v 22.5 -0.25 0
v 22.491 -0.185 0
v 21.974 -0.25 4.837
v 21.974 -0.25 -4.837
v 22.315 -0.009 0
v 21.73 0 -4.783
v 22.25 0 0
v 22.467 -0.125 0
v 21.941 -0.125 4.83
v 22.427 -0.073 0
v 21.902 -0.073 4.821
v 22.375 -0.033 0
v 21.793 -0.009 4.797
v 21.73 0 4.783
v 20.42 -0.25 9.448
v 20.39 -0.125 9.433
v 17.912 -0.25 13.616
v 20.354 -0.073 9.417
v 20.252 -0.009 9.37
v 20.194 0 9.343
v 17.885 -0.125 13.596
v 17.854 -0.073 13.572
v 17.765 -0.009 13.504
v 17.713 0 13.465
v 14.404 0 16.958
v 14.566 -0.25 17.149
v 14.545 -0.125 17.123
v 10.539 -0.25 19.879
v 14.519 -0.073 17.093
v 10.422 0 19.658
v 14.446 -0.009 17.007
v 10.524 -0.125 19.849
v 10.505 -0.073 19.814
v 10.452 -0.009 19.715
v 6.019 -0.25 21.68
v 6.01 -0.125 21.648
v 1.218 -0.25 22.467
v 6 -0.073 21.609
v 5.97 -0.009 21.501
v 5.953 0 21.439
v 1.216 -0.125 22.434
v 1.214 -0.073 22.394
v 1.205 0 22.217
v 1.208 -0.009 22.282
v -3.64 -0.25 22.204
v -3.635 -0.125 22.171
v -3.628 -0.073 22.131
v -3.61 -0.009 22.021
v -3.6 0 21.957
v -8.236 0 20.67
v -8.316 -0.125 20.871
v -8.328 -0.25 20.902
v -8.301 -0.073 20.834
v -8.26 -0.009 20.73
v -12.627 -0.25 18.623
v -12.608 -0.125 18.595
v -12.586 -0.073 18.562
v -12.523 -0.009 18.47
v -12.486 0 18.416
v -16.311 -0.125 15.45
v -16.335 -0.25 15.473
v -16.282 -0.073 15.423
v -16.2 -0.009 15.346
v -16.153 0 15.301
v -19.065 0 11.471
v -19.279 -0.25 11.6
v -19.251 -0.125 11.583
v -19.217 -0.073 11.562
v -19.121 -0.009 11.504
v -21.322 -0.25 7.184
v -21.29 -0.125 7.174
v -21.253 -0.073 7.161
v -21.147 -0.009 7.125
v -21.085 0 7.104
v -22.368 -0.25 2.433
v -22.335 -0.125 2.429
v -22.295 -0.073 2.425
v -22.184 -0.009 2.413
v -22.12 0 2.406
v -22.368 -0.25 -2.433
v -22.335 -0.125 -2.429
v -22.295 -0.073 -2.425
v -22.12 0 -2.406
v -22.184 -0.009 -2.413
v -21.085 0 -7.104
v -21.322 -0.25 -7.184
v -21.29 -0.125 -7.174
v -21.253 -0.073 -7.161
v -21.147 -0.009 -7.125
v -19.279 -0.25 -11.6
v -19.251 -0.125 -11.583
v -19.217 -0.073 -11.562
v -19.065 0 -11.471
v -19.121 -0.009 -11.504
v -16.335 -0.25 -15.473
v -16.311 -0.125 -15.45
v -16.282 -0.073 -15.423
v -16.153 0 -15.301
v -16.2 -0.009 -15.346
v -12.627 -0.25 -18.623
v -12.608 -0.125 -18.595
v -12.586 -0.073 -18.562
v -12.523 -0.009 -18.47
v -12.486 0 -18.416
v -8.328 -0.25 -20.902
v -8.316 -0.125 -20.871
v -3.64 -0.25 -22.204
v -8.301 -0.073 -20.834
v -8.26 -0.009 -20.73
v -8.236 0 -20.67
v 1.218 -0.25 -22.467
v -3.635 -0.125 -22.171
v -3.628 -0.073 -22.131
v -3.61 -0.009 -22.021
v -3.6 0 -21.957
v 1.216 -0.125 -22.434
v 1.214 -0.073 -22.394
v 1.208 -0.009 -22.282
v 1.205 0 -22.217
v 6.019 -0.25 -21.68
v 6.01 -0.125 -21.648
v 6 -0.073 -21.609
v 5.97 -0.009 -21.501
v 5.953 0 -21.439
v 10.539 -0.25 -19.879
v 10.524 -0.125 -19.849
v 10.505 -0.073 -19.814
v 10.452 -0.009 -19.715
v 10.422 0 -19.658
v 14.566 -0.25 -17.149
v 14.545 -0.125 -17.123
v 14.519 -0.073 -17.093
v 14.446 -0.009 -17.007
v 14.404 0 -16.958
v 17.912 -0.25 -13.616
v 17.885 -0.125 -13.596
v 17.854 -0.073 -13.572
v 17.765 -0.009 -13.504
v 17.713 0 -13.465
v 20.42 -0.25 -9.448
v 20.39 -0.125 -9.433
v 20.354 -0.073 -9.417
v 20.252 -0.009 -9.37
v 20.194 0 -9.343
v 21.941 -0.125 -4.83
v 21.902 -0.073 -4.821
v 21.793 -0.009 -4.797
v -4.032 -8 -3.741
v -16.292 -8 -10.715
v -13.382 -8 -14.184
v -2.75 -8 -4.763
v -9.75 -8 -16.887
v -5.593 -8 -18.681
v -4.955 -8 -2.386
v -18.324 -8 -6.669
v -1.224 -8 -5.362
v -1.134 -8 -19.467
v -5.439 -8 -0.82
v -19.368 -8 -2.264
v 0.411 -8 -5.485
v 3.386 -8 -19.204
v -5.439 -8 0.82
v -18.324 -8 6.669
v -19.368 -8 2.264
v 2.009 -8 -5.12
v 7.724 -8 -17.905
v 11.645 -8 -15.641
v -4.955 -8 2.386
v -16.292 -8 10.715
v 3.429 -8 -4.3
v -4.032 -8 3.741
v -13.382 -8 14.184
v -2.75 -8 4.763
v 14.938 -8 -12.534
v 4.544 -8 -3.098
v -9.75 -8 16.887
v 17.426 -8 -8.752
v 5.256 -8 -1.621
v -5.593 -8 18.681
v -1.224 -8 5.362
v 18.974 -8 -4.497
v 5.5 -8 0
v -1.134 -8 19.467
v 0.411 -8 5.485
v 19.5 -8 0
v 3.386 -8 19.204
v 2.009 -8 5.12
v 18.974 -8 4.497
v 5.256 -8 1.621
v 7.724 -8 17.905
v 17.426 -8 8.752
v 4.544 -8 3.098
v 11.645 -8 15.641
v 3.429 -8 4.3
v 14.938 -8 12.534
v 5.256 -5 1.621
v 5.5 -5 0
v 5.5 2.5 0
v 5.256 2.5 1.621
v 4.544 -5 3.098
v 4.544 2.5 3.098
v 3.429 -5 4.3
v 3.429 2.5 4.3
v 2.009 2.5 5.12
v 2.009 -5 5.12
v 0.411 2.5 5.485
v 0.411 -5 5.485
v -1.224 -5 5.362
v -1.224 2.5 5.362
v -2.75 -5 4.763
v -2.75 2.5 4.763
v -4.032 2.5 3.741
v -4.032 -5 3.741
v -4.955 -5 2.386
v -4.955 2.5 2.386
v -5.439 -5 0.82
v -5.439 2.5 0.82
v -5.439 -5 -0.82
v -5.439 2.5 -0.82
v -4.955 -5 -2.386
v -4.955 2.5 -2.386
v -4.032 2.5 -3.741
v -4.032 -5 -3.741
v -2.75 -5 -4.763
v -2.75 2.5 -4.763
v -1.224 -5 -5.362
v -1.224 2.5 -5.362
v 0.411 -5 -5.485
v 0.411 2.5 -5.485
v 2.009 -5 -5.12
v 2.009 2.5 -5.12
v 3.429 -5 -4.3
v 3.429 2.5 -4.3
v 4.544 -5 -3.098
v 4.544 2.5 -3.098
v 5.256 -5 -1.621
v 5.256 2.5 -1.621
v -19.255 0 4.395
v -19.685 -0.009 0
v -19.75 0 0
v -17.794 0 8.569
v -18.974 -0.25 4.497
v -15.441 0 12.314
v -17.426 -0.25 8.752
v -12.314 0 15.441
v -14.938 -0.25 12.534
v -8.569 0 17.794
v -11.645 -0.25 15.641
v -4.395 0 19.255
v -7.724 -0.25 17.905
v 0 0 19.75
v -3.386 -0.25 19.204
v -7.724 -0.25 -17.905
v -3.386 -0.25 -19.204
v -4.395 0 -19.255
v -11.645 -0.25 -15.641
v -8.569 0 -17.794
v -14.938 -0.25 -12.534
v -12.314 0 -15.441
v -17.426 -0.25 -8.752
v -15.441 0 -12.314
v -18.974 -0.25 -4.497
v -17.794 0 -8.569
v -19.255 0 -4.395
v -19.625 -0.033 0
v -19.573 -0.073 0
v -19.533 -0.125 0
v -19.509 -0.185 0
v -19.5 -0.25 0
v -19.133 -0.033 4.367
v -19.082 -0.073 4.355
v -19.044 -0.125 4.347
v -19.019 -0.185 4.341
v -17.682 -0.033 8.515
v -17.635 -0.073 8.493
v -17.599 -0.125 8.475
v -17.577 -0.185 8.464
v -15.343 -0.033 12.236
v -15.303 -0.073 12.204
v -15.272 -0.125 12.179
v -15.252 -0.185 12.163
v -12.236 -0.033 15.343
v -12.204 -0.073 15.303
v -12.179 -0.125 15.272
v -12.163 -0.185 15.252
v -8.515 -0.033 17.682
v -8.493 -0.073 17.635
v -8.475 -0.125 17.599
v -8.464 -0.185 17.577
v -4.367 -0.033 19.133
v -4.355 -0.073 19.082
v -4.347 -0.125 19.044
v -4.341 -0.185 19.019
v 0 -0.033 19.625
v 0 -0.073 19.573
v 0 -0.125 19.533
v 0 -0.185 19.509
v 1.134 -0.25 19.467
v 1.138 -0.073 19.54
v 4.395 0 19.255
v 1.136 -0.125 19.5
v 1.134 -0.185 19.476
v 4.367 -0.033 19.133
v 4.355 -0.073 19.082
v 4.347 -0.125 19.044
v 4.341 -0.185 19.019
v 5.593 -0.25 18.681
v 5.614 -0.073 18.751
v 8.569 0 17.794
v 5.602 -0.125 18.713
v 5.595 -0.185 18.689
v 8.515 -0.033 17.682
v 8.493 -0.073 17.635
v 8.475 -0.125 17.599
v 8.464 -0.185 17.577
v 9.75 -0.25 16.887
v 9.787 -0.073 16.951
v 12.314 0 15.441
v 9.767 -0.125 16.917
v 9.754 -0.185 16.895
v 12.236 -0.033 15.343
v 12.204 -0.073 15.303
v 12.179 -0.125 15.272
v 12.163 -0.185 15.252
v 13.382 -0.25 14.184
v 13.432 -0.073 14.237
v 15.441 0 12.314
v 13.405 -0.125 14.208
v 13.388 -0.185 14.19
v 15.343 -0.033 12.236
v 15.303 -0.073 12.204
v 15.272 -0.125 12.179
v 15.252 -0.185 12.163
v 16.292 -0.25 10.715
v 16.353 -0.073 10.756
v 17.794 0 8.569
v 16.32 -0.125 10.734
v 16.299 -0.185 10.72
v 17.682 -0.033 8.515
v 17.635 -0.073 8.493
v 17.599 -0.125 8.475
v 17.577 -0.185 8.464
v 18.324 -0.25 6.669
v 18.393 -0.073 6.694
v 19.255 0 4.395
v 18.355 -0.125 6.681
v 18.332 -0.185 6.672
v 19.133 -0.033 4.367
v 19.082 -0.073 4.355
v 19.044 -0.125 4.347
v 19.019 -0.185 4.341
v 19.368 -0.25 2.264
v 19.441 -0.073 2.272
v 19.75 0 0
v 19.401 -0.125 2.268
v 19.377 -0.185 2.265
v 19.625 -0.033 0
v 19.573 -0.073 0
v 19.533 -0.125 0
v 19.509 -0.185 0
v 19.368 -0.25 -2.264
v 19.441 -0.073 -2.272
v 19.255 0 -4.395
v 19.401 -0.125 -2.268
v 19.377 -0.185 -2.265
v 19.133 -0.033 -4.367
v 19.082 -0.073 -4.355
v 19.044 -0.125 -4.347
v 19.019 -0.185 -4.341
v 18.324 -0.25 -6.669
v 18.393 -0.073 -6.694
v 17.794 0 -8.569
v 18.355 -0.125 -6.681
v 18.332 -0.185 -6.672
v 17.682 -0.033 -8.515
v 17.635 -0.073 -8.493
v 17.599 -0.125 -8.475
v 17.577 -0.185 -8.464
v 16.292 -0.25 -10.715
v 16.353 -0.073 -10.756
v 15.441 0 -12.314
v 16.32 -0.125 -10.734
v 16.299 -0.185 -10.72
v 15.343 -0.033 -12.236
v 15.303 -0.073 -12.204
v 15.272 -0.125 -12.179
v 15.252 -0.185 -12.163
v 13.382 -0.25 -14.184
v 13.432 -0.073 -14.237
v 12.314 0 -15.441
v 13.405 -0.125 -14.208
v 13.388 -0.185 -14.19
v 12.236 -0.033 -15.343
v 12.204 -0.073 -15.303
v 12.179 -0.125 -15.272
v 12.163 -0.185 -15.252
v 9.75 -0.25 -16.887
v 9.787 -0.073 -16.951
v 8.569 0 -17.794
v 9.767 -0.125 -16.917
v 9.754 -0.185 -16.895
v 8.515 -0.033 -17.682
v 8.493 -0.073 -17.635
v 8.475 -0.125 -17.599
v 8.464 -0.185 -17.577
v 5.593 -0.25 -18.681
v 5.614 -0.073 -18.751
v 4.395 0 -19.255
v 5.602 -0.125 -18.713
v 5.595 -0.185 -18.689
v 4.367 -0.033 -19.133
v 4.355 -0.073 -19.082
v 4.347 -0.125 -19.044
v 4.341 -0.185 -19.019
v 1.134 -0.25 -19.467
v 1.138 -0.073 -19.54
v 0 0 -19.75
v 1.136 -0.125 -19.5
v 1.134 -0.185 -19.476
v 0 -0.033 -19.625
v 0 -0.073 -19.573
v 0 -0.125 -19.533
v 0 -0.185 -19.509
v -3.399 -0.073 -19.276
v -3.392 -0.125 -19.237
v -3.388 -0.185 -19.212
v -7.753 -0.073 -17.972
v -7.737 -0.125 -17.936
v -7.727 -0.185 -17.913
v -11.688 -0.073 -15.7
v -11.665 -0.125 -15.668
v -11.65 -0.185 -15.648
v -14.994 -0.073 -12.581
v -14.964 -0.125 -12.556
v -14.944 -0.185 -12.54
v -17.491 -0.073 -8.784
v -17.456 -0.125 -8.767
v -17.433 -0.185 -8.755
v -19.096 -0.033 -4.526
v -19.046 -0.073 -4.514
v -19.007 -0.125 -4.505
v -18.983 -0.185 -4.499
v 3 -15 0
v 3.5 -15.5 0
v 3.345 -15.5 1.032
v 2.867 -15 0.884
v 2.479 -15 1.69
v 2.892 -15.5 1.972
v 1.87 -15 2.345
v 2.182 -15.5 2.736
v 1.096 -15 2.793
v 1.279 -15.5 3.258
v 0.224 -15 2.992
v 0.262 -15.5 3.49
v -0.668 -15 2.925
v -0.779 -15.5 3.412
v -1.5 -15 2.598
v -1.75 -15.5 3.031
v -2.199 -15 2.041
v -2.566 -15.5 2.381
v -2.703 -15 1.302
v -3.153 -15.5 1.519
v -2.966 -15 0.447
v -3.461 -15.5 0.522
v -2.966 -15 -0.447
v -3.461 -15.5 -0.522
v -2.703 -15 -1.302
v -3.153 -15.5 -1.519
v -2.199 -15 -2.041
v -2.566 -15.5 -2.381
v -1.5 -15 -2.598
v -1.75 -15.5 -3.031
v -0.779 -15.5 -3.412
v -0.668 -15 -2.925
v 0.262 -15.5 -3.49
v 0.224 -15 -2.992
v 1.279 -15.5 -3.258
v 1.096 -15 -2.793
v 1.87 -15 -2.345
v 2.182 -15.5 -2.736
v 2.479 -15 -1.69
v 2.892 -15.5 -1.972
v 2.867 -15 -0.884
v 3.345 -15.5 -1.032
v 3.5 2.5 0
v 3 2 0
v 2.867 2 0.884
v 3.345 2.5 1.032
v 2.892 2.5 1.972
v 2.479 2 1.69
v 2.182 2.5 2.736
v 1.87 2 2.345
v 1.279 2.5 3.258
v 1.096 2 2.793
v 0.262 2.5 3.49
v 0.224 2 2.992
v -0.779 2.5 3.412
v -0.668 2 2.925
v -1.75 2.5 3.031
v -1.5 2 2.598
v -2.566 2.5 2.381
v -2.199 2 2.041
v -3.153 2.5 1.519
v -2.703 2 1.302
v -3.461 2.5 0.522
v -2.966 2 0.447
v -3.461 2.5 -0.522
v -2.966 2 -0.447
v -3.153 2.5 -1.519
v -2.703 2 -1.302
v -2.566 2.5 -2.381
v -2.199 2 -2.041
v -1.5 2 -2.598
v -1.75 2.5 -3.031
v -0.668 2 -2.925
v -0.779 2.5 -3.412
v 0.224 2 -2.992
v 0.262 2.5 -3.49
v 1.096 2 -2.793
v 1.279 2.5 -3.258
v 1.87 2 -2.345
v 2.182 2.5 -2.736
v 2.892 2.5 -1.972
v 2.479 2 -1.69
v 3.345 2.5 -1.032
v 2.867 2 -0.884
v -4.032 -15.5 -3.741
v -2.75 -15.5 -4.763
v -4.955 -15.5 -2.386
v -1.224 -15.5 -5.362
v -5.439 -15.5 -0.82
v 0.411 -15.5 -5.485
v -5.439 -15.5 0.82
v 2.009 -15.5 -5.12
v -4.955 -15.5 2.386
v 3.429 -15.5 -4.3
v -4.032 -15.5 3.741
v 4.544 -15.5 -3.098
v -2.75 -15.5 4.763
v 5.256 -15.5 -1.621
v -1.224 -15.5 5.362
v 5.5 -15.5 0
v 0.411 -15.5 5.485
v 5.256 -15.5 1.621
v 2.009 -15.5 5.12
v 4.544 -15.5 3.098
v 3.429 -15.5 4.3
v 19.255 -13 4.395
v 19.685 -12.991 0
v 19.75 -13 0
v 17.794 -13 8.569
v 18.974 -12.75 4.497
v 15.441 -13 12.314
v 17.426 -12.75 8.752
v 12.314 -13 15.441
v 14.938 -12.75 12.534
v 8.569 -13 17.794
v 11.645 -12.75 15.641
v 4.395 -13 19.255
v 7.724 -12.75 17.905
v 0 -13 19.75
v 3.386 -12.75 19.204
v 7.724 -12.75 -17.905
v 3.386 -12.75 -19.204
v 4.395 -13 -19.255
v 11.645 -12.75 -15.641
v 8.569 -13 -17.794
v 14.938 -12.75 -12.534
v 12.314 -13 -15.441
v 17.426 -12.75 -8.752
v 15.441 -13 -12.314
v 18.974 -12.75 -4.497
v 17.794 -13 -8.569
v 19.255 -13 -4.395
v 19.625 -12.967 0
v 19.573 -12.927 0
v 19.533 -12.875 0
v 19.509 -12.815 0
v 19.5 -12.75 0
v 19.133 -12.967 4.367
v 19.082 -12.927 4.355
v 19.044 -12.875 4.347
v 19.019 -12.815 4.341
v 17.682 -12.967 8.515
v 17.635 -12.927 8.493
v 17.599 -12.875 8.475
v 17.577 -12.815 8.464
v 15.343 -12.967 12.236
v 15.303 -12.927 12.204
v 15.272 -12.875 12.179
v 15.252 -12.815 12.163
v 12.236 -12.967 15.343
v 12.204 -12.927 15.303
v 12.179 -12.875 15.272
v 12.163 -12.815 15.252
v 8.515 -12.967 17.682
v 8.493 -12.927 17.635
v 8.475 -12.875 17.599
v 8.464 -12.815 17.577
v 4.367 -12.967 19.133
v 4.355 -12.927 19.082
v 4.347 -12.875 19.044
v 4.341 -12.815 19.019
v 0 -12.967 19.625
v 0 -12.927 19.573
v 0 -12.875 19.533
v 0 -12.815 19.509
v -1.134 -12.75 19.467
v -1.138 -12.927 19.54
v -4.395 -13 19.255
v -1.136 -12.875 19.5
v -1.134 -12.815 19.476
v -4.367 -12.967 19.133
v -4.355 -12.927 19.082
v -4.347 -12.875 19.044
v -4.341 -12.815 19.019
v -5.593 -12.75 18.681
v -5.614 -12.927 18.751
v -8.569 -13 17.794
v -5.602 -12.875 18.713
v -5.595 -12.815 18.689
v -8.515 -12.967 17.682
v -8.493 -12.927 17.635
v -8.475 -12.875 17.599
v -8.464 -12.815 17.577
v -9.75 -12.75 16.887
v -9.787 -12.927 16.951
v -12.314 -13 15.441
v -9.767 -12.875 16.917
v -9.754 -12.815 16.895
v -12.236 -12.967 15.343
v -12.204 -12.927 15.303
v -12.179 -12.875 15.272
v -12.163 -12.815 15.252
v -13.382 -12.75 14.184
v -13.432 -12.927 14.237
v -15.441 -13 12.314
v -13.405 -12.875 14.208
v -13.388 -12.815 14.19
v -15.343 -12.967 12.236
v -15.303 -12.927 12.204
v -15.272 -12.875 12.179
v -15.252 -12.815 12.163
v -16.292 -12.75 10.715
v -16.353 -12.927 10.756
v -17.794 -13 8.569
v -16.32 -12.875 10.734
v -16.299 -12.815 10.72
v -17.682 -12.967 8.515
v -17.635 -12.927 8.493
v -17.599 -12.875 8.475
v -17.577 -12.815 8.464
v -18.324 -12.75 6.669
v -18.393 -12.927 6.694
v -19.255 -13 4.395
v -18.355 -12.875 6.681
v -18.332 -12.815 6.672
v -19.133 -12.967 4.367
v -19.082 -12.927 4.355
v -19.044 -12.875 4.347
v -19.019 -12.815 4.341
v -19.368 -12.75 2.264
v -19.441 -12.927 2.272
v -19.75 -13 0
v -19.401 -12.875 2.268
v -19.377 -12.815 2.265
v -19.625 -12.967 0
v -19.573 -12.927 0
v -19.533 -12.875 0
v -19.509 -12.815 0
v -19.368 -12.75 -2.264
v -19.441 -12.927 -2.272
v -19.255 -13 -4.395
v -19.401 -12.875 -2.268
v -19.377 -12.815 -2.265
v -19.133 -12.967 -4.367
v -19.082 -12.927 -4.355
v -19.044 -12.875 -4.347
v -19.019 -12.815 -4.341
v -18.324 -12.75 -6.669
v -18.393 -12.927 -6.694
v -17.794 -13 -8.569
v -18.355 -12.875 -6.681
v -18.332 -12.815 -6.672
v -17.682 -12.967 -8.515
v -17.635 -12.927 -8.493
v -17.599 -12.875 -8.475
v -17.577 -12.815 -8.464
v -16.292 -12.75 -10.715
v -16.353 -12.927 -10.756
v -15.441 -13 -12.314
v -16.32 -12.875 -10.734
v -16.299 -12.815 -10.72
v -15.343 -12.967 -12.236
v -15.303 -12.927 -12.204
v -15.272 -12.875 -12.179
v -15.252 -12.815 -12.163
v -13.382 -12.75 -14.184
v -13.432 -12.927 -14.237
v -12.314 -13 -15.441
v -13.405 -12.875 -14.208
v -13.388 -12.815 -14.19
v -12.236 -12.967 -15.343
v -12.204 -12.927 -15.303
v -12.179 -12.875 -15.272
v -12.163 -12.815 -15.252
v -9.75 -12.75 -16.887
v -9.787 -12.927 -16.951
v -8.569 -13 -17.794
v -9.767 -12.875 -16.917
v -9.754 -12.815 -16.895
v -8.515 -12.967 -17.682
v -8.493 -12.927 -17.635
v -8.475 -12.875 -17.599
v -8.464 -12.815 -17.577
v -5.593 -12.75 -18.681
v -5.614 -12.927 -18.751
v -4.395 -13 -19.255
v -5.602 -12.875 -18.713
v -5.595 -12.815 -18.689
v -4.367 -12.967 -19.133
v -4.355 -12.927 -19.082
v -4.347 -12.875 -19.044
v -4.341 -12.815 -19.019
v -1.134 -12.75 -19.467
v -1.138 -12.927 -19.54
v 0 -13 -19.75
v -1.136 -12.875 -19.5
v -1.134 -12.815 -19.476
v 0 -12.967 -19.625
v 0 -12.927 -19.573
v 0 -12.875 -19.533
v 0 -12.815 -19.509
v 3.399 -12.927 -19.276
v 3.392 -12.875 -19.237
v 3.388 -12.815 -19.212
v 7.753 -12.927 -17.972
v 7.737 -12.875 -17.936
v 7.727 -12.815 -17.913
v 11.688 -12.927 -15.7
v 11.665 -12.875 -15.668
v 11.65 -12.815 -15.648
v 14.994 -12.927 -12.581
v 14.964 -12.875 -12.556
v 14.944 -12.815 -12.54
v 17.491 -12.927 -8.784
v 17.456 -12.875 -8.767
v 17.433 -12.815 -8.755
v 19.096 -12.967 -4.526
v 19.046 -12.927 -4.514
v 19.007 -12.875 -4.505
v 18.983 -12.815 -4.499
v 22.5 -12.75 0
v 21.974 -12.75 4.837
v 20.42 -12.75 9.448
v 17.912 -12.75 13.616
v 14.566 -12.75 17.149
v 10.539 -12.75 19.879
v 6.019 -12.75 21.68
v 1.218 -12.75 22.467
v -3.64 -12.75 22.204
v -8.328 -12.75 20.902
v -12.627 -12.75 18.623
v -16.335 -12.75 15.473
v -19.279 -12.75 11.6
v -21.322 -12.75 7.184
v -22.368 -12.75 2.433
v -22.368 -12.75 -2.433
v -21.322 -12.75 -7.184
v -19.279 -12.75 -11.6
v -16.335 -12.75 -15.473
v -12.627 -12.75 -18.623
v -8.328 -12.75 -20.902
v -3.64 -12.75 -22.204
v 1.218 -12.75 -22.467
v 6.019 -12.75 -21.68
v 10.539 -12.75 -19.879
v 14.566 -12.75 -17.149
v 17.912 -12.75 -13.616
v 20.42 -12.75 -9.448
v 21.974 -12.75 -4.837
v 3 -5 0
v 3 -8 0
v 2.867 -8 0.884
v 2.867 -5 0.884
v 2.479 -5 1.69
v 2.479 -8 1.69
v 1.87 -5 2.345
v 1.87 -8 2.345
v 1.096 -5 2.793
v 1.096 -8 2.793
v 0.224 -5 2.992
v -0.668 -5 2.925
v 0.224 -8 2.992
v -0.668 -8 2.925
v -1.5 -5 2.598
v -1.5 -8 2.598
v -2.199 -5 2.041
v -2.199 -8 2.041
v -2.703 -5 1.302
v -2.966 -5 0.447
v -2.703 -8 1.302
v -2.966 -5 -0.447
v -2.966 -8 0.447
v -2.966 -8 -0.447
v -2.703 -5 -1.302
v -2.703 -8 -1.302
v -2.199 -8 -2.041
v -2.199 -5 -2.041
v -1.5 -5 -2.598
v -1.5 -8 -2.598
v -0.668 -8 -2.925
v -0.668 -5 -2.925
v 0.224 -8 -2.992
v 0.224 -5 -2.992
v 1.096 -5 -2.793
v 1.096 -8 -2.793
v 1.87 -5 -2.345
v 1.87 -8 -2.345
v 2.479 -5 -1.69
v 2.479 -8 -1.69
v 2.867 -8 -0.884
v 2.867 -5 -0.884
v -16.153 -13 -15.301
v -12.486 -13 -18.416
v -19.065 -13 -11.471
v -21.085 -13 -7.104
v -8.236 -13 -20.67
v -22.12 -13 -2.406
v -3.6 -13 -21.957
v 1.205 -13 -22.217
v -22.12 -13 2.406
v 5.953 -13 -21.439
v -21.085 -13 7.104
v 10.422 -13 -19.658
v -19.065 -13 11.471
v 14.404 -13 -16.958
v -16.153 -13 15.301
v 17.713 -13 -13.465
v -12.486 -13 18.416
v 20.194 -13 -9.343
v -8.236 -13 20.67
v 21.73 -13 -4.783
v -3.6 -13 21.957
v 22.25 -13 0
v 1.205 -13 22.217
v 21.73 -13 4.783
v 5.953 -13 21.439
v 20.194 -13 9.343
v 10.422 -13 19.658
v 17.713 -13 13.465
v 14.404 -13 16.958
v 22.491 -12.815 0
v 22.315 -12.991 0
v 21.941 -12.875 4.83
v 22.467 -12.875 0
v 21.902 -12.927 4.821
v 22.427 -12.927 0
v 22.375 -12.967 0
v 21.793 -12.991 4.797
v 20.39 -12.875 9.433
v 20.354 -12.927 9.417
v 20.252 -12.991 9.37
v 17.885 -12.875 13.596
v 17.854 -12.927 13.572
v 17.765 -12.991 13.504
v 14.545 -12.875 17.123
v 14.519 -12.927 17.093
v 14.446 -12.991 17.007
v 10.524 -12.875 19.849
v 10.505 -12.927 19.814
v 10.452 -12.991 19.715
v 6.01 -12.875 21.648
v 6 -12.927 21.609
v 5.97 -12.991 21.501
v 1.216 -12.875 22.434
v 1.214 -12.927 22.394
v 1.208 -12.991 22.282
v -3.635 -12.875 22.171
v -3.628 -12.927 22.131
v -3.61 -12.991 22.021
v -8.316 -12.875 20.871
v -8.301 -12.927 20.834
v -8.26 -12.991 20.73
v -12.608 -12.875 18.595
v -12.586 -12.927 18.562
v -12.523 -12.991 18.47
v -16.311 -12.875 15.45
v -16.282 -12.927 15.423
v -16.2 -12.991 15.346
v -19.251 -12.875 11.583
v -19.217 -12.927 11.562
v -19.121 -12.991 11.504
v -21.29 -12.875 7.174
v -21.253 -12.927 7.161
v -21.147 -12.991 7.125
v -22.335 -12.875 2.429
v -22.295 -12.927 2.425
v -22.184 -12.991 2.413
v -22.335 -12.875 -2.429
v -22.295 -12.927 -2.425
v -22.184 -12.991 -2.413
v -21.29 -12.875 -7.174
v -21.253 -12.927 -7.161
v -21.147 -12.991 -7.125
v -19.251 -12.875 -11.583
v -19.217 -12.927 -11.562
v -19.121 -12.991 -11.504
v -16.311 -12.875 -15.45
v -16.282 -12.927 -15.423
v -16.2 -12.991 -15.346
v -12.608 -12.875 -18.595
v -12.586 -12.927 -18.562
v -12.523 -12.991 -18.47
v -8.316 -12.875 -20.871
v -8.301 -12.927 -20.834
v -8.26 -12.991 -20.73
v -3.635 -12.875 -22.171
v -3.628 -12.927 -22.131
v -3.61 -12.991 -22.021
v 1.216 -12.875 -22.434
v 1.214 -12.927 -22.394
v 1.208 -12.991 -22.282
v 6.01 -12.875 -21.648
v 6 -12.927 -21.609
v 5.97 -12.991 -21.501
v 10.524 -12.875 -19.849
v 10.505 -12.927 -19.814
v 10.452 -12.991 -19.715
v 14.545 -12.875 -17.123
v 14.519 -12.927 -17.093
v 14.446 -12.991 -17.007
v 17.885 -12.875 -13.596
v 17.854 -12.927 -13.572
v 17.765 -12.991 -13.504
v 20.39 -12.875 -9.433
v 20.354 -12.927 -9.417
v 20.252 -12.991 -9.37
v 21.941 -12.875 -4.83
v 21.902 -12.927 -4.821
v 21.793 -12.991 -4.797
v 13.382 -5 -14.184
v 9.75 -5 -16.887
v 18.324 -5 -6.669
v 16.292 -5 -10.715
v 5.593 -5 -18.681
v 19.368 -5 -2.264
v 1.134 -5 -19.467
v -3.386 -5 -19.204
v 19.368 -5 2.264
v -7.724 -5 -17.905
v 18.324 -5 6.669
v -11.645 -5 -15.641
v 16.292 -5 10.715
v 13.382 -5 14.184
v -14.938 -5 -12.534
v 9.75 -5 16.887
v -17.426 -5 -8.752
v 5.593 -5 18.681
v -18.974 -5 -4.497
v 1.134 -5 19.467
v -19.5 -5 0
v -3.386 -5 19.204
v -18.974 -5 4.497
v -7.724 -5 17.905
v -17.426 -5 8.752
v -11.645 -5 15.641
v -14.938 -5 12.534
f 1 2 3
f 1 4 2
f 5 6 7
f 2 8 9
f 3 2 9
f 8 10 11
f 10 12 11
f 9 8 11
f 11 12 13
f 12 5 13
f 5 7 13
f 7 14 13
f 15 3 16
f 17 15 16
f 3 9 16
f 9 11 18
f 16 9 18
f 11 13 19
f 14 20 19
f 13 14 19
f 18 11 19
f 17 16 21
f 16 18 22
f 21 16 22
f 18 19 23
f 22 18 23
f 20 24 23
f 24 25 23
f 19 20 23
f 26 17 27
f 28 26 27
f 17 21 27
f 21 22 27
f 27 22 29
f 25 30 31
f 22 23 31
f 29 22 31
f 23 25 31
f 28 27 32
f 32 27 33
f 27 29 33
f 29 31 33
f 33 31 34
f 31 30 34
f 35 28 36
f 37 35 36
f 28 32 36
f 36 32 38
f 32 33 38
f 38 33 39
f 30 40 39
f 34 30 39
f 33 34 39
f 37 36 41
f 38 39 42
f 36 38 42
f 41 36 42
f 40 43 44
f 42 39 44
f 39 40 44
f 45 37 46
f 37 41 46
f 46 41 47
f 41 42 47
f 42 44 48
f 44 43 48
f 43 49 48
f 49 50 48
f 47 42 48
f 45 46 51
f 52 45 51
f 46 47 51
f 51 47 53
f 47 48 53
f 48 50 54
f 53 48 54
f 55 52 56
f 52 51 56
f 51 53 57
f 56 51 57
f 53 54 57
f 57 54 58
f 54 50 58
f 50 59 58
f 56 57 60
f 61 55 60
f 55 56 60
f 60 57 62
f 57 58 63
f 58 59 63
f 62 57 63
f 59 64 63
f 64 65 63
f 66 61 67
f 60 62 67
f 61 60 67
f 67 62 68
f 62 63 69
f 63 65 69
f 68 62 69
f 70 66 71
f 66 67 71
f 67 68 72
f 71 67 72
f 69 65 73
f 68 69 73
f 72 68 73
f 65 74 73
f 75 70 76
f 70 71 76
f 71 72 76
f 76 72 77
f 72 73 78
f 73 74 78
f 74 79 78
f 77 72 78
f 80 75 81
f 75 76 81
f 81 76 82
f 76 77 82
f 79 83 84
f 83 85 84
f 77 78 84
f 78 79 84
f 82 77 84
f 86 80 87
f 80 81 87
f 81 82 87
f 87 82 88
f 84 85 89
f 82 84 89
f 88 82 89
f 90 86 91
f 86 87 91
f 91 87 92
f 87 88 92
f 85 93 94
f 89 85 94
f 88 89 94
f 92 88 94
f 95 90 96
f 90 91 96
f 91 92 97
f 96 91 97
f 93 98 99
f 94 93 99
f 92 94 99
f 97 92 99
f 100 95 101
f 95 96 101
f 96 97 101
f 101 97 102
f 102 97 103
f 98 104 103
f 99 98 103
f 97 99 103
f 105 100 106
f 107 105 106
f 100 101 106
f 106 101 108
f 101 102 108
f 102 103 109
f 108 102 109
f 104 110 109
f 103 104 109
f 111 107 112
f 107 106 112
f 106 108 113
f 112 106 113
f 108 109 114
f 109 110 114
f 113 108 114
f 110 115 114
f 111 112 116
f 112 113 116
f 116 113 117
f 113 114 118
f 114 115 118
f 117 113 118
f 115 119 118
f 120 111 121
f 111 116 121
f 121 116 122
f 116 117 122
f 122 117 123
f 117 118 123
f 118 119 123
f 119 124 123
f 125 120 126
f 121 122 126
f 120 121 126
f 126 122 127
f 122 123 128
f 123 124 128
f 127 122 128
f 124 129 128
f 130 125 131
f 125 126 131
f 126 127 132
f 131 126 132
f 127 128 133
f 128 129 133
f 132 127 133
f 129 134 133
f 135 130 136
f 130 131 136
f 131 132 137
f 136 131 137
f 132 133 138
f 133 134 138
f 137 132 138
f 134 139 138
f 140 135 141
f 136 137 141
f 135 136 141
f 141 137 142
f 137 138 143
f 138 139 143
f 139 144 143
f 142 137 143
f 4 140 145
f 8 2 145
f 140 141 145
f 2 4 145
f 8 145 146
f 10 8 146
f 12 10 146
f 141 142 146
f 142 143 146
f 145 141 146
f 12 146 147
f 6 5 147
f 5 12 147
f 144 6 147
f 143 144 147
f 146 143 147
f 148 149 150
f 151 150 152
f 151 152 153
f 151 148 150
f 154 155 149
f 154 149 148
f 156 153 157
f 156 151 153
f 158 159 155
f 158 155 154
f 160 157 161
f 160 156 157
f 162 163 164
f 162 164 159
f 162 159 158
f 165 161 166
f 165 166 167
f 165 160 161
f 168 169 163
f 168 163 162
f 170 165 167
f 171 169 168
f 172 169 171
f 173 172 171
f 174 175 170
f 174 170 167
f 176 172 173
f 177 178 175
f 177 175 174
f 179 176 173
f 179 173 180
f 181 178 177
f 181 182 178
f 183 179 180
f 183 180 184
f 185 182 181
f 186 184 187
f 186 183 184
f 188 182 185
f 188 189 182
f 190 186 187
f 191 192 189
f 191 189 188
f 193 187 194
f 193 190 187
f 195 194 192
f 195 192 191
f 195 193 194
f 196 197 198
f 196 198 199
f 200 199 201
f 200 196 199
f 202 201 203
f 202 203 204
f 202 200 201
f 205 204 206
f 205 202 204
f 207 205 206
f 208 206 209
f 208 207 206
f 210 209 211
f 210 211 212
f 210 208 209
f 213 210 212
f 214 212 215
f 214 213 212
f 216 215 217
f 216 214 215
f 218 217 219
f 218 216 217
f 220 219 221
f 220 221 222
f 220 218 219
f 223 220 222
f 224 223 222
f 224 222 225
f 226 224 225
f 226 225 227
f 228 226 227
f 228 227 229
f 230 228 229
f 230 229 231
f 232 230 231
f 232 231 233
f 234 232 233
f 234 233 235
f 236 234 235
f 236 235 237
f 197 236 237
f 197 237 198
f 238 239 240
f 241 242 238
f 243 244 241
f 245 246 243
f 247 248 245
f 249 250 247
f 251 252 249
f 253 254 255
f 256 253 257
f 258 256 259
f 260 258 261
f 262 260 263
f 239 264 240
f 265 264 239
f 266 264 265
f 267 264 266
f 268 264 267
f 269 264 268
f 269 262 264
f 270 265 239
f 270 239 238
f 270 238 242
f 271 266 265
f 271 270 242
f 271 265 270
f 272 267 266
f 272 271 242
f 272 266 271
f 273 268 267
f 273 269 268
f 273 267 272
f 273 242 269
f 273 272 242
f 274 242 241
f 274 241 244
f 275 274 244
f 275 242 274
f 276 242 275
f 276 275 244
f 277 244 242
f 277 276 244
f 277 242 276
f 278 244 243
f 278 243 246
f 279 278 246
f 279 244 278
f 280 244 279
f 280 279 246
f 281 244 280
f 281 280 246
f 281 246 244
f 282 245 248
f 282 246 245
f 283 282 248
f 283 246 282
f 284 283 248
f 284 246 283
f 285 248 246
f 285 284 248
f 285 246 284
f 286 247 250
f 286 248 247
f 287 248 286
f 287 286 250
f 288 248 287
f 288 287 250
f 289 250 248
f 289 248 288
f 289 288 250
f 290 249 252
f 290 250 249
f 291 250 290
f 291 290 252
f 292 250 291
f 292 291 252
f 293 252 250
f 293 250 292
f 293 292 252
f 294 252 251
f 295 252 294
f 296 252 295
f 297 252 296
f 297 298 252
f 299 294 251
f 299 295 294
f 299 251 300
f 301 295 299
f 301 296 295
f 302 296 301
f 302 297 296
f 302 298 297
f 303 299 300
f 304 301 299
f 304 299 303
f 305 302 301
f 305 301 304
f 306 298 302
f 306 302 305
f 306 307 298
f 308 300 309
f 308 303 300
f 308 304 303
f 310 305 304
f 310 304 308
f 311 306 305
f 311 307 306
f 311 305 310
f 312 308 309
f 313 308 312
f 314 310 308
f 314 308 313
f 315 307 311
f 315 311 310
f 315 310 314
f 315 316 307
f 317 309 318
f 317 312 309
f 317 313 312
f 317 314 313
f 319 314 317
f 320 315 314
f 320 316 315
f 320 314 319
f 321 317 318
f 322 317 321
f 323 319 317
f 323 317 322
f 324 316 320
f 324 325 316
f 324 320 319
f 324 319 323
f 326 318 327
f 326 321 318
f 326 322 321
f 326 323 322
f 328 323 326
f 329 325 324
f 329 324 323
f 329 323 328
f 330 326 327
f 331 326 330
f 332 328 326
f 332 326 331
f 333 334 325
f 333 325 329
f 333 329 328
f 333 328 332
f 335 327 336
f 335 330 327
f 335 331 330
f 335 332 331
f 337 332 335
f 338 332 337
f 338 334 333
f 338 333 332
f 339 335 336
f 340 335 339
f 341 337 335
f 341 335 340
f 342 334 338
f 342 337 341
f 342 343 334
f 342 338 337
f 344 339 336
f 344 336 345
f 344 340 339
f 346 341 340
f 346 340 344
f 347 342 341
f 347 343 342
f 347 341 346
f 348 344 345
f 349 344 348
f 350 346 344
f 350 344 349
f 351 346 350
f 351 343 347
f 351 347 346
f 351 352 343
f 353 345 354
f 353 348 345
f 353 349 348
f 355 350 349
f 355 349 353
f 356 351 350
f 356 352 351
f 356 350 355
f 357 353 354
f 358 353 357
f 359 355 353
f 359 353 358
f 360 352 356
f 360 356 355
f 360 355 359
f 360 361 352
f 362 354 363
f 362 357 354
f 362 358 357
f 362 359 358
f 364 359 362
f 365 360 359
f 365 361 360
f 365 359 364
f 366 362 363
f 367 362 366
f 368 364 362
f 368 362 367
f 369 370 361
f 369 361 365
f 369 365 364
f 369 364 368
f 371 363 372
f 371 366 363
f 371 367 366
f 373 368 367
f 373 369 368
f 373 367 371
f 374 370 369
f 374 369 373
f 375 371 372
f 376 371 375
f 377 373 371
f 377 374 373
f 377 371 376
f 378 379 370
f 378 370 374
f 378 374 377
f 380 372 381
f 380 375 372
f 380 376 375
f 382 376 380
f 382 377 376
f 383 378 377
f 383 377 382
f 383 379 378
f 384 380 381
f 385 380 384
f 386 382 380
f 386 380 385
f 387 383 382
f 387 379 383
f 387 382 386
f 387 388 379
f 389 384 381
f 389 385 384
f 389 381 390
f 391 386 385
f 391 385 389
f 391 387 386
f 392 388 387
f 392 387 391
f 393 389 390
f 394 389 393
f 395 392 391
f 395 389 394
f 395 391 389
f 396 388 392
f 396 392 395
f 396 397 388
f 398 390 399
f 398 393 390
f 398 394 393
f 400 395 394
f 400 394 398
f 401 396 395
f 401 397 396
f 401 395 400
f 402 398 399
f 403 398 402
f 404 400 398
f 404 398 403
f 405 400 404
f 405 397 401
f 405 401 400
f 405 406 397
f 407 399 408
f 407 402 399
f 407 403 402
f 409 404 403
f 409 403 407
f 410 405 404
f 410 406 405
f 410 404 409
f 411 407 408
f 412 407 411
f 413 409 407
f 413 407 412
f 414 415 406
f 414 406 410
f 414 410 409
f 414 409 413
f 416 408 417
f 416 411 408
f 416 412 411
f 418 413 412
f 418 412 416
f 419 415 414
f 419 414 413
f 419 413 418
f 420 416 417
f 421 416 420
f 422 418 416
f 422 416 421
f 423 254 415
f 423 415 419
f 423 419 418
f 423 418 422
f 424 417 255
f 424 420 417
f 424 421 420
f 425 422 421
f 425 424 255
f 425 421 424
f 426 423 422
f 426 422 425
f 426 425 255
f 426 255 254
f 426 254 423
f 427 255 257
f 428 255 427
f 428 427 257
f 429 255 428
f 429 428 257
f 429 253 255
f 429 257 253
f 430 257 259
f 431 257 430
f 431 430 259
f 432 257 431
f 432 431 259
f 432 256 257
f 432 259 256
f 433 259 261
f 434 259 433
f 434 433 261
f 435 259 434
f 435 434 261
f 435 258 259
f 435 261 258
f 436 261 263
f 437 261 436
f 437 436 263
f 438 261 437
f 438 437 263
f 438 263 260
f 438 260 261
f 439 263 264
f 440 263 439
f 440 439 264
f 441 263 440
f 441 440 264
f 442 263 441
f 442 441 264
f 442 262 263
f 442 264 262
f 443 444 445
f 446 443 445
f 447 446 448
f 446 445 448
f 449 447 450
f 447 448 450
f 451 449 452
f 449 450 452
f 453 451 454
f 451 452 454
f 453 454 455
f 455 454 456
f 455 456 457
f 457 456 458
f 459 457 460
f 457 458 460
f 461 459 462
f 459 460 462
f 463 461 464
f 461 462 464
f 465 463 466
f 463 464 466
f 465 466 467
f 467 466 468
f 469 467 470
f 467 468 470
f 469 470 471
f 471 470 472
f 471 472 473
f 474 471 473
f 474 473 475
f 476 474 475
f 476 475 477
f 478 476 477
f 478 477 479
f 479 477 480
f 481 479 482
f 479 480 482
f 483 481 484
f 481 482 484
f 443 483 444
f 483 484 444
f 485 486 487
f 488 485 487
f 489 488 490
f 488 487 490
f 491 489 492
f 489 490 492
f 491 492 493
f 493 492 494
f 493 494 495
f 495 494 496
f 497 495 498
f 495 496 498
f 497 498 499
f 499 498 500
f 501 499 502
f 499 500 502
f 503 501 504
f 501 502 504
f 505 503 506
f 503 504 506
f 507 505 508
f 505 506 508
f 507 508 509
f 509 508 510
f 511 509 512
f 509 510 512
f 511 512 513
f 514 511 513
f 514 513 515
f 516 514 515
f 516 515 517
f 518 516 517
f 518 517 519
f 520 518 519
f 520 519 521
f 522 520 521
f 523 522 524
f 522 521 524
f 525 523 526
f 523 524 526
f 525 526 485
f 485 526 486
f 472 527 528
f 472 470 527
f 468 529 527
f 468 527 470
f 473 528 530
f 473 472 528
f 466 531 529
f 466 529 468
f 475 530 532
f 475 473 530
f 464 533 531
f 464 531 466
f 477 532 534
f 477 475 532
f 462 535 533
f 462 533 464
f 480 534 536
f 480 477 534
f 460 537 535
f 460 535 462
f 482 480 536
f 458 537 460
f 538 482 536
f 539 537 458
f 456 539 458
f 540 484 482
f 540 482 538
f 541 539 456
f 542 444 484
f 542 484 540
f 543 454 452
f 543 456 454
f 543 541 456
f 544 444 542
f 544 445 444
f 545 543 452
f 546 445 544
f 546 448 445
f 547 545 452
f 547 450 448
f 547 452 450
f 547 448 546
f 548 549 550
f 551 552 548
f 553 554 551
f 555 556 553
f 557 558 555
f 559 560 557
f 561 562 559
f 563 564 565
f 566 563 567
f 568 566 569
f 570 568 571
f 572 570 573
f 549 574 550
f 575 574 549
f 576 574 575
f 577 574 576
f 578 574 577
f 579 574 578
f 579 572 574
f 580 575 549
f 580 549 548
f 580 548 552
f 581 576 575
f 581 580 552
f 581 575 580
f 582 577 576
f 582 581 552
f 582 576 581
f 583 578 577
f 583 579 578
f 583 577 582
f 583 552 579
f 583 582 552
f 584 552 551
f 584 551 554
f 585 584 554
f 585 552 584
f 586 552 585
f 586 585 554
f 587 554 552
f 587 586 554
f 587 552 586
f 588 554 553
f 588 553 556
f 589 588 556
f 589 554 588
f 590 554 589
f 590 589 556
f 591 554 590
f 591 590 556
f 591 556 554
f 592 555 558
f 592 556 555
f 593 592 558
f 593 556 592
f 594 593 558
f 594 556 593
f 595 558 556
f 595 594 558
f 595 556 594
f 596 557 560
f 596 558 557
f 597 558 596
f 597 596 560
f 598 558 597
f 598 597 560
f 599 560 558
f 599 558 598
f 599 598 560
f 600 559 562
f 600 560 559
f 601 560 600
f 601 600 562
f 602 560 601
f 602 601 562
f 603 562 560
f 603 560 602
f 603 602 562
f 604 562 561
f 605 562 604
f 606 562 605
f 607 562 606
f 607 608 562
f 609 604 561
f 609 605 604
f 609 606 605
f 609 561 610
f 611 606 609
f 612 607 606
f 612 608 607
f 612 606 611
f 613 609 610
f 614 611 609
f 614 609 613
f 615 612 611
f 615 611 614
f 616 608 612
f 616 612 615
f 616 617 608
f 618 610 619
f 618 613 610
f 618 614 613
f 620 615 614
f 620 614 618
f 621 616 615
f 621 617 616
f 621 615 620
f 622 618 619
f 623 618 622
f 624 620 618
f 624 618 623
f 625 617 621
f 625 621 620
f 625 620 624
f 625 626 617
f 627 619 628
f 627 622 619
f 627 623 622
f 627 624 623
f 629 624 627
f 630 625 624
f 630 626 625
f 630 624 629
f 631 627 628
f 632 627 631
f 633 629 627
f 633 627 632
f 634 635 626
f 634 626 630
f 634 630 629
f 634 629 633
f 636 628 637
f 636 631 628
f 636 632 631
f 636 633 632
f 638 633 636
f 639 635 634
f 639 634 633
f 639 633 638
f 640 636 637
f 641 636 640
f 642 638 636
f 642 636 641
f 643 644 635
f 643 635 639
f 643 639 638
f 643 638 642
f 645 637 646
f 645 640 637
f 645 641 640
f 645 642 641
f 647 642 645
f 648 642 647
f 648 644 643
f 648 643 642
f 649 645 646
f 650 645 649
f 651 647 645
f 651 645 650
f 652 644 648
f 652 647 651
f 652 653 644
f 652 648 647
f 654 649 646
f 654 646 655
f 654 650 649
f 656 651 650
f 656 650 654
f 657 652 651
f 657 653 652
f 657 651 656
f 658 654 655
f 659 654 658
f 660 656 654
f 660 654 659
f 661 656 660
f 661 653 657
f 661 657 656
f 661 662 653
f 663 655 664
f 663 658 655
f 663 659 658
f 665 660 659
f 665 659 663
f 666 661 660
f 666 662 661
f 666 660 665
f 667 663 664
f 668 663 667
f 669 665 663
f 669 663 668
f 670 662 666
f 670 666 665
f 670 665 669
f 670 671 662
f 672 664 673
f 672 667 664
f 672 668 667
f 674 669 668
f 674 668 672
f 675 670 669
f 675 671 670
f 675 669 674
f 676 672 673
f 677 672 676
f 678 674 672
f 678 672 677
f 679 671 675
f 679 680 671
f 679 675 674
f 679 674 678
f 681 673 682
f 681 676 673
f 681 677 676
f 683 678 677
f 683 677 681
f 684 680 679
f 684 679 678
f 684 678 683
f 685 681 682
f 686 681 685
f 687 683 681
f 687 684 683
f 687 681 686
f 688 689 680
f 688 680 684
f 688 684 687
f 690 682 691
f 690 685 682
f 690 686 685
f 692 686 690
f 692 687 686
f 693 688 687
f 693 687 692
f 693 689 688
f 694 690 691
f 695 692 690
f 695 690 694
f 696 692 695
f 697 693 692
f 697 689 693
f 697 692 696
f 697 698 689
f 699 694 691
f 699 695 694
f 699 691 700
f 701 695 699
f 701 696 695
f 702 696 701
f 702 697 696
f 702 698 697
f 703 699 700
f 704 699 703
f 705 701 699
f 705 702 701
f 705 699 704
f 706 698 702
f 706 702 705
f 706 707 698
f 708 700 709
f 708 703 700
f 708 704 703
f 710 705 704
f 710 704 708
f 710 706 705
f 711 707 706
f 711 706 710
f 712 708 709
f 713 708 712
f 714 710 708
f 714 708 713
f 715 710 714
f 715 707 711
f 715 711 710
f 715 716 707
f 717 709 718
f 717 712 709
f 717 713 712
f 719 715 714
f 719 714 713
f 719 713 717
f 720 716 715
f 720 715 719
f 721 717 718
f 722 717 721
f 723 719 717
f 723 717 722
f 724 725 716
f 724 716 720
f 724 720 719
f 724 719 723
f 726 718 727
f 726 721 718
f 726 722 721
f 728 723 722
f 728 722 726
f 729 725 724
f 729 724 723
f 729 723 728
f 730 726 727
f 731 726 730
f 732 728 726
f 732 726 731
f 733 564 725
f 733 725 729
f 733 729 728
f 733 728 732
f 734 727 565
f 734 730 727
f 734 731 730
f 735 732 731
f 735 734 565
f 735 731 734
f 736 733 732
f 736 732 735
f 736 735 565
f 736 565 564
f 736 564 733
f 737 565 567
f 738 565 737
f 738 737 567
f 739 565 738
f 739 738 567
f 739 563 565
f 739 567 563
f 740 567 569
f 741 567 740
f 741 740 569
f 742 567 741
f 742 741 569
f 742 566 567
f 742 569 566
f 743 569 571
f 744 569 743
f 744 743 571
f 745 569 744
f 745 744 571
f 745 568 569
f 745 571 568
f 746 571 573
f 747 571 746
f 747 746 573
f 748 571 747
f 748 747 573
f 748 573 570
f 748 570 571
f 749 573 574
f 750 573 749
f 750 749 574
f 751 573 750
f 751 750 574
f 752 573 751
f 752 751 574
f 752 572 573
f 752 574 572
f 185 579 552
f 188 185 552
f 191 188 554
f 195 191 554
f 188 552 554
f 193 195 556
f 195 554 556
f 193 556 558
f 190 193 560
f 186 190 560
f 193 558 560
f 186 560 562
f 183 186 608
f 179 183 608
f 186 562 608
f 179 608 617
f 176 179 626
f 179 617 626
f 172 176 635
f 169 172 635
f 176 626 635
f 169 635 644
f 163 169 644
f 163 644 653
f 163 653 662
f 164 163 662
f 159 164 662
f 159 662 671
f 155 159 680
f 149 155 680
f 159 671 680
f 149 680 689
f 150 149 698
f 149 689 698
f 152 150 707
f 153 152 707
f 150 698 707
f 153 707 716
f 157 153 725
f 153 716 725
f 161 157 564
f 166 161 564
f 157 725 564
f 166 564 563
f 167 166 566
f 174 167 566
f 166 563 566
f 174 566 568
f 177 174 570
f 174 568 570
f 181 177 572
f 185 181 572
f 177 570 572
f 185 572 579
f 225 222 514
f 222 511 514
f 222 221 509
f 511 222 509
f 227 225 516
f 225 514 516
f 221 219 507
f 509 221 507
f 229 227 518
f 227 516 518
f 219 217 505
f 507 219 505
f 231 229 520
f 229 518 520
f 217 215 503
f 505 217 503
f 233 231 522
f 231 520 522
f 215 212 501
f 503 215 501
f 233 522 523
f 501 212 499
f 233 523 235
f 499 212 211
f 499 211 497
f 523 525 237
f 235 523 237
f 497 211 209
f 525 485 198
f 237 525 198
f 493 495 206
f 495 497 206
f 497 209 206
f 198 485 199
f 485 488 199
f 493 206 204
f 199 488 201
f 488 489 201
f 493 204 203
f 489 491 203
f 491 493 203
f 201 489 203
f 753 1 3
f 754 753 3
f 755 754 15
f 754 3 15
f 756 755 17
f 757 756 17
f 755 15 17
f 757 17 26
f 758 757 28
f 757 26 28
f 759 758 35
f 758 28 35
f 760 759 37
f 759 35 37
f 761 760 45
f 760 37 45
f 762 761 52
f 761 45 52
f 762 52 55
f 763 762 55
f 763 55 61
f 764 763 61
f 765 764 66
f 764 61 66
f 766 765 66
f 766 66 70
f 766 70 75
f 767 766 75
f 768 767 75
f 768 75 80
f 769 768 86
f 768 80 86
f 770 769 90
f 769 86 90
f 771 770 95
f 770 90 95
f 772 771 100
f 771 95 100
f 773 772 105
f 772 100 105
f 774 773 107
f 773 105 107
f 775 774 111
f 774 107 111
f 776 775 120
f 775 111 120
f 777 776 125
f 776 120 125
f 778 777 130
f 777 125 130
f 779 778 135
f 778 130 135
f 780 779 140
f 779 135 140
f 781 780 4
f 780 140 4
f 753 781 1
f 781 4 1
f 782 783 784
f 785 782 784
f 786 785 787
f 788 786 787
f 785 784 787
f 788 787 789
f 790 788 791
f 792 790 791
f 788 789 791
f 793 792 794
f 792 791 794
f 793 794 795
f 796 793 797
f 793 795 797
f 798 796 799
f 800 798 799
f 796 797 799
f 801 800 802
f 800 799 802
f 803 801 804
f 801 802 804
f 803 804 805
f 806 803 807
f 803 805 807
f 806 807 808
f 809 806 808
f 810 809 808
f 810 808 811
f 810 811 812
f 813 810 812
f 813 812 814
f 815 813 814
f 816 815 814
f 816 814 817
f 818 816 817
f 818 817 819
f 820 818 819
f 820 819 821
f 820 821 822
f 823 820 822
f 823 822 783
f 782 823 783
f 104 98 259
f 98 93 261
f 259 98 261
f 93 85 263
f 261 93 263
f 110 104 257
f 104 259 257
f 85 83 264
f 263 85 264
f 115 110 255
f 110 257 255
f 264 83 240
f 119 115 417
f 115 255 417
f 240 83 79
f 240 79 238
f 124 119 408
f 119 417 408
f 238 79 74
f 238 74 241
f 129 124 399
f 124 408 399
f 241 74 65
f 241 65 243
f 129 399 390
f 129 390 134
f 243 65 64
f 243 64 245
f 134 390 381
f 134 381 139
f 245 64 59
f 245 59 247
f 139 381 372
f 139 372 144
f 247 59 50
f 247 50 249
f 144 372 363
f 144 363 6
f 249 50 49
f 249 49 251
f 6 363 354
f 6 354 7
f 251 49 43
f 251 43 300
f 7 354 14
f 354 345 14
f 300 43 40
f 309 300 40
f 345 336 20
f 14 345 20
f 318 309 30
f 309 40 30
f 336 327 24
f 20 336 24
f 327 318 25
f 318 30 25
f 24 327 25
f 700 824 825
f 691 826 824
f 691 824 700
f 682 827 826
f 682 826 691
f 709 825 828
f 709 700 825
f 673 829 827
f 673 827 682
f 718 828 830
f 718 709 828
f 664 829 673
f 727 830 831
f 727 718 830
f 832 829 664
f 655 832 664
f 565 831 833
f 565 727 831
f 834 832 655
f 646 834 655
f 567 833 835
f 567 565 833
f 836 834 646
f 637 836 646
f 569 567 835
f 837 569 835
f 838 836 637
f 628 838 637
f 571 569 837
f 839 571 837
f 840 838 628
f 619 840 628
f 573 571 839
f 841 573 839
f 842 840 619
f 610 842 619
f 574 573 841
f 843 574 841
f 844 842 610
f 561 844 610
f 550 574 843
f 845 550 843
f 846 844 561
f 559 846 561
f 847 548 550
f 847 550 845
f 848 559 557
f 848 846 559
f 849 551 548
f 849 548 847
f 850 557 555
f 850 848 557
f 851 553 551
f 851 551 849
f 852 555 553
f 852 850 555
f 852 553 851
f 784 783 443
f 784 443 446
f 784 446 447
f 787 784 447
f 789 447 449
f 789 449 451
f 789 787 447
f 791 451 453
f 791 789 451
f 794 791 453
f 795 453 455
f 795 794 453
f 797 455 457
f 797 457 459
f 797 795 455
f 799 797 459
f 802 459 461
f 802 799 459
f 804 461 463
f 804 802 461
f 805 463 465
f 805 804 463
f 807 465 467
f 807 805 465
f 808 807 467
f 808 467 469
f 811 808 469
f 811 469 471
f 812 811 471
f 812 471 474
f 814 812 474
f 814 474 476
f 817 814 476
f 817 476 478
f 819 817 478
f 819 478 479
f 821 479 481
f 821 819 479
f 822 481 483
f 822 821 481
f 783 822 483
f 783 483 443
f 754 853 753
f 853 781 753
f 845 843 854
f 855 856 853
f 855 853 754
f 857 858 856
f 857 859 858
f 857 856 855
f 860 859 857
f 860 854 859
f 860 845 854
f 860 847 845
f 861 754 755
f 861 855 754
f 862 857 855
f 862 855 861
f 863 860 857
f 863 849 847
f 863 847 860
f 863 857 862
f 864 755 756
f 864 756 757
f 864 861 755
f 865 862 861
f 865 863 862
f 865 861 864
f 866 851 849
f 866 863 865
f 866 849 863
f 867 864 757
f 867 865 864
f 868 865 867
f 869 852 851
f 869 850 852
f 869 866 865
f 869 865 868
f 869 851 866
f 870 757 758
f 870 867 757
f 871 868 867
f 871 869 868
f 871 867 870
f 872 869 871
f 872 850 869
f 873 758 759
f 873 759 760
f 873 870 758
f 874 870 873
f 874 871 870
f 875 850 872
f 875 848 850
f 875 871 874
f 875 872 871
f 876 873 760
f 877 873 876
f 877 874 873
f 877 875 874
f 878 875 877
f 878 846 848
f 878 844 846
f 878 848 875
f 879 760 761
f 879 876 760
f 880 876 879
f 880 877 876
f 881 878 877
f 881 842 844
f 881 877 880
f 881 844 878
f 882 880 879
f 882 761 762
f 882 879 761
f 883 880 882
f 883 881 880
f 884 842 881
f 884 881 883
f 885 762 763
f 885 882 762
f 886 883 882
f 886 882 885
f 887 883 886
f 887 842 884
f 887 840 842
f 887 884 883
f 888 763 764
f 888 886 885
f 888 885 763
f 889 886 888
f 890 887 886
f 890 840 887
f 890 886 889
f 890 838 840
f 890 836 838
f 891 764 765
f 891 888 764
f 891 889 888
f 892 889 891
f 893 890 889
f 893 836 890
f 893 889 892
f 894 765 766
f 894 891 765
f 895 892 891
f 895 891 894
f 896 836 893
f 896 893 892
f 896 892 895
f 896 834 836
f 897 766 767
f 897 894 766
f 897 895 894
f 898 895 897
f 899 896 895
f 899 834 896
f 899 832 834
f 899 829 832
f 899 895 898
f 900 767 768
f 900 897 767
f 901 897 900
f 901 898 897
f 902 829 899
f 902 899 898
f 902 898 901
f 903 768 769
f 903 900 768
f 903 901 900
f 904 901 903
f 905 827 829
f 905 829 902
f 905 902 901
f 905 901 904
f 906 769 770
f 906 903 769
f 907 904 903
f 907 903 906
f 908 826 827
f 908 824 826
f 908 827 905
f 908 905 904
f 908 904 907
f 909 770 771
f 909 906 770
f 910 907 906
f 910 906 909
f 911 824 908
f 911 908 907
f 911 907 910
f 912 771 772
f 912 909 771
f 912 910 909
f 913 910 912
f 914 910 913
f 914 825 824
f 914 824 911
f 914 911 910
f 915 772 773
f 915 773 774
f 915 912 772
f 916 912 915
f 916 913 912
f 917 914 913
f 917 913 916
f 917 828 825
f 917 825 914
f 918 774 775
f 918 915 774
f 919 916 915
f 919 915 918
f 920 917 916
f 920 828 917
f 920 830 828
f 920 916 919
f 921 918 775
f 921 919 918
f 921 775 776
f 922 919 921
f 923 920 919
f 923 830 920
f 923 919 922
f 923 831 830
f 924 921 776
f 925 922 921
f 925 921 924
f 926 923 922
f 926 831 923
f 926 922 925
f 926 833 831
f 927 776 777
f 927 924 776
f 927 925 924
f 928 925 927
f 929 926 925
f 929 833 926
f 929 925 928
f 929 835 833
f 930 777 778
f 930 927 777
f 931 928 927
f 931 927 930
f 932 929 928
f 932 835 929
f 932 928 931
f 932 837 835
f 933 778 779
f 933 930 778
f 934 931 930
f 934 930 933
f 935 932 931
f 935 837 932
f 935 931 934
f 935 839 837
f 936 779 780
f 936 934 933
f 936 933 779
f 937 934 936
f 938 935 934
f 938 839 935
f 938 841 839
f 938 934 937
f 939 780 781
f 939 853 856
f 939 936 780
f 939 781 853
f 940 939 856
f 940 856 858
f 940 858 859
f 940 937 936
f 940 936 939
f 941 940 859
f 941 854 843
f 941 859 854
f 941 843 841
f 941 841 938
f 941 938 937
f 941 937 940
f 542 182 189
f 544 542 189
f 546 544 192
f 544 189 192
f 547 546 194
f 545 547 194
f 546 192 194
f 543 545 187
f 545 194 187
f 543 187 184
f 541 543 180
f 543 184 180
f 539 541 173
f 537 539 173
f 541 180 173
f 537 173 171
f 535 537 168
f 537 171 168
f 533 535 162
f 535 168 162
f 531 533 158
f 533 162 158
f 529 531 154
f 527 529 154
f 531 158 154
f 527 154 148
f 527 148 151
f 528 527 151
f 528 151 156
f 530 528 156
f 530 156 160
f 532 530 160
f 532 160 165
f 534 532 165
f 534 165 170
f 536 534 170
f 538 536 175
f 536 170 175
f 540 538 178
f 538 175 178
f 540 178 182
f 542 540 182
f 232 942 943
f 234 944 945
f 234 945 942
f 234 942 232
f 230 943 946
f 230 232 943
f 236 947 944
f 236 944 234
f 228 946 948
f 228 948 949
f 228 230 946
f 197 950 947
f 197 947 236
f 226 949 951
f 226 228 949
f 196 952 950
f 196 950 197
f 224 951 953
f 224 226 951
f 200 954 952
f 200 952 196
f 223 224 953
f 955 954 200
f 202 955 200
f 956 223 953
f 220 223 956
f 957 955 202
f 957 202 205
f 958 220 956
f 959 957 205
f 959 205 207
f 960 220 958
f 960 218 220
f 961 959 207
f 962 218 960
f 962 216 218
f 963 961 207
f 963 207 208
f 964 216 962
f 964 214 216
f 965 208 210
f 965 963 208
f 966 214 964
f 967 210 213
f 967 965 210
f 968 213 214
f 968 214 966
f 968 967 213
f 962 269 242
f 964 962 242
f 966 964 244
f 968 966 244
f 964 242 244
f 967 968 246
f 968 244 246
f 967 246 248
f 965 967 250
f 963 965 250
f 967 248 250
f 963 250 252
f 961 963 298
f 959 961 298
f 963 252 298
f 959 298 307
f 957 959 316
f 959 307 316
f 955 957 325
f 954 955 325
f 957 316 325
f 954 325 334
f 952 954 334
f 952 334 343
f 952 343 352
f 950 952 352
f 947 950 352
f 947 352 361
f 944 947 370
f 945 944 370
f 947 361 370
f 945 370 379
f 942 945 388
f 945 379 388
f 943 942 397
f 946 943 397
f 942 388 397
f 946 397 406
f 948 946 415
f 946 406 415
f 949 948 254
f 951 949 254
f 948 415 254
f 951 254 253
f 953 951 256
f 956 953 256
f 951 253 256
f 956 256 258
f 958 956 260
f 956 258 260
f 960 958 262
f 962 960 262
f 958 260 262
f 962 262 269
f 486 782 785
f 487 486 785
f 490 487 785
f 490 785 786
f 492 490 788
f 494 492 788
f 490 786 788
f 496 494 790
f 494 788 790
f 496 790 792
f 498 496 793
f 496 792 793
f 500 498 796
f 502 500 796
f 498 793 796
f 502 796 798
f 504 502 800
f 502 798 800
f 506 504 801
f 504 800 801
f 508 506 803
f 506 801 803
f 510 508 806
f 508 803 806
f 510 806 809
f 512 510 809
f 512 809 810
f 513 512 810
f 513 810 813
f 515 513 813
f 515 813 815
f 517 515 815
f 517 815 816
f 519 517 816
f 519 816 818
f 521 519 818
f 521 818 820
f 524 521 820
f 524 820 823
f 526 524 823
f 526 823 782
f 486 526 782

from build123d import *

# Parameters (mm, degrees)
F0_R          = 22.5
F1_DEPTH      = 13
F2_R          = 19.5
F3_DEPTH      = 5
F4_R          = 19.5
F5_DEPTH      = 5
F6_R          = 0.25
F7_R          = 5.5
F7_R_2        = 3
F8_DEPTH      = 7.5
F8_DEPTH_BACK = 10.5
F9_R          = 3
F10_DEPTH     = 25
F11_SIZE      = 0.5


with BuildPart() as f1:
    # F0 (on Front) → F1 (new body)
    with BuildSketch(Plane.XZ):
        Circle(F0_R)
    extrude(amount=F1_DEPTH)

    # F2 (on face) → F3 (cut)
    with BuildSketch(Plane(origin=(0, 0, 0), x_dir=(-1, 0, 0), z_dir=(0, 1, 0))):
        Circle(F2_R)
    extrude(amount=-F3_DEPTH, mode=Mode.SUBTRACT)

    # F4 (on face) → F5 (cut)
    with BuildSketch(Plane.XZ.offset(13)):
        Circle(F4_R)
    extrude(amount=-F5_DEPTH, mode=Mode.SUBTRACT)

    # F6
    f6_edges = [f1.edges().sort_by_distance(p)[0] for p in [
        (-22.5, -13, 0),
        (-22.5, 0, 0),
        (-19.5, -13, 0),
        (19.5, 0, 0),
    ]]
    fillet(f6_edges, radius=F6_R)

    # F7 (on face) → F8 (join, two sides)
    with BuildSketch(Plane.XZ.offset(8)) as f8_sk:
        Circle(F7_R)
        Circle(F7_R_2, mode=Mode.SUBTRACT)
    extrude(amount=F8_DEPTH)
    extrude(f8_sk.sketch, amount=-F8_DEPTH_BACK)

    # F9 (on face) → F10 (cut)
    with BuildSketch(Plane.XZ.offset(15.5)):
        Circle(F9_R)
    extrude(amount=-F10_DEPTH, mode=Mode.SUBTRACT)

    # F11
    f11_edges = [f1.edges().sort_by_distance(p)[0] for p in [
        (-3, -15.5, 0),
        (-3, 2.5, 0),
    ]]
    chamfer(f11_edges, length=F11_SIZE)


solid = f1.part
